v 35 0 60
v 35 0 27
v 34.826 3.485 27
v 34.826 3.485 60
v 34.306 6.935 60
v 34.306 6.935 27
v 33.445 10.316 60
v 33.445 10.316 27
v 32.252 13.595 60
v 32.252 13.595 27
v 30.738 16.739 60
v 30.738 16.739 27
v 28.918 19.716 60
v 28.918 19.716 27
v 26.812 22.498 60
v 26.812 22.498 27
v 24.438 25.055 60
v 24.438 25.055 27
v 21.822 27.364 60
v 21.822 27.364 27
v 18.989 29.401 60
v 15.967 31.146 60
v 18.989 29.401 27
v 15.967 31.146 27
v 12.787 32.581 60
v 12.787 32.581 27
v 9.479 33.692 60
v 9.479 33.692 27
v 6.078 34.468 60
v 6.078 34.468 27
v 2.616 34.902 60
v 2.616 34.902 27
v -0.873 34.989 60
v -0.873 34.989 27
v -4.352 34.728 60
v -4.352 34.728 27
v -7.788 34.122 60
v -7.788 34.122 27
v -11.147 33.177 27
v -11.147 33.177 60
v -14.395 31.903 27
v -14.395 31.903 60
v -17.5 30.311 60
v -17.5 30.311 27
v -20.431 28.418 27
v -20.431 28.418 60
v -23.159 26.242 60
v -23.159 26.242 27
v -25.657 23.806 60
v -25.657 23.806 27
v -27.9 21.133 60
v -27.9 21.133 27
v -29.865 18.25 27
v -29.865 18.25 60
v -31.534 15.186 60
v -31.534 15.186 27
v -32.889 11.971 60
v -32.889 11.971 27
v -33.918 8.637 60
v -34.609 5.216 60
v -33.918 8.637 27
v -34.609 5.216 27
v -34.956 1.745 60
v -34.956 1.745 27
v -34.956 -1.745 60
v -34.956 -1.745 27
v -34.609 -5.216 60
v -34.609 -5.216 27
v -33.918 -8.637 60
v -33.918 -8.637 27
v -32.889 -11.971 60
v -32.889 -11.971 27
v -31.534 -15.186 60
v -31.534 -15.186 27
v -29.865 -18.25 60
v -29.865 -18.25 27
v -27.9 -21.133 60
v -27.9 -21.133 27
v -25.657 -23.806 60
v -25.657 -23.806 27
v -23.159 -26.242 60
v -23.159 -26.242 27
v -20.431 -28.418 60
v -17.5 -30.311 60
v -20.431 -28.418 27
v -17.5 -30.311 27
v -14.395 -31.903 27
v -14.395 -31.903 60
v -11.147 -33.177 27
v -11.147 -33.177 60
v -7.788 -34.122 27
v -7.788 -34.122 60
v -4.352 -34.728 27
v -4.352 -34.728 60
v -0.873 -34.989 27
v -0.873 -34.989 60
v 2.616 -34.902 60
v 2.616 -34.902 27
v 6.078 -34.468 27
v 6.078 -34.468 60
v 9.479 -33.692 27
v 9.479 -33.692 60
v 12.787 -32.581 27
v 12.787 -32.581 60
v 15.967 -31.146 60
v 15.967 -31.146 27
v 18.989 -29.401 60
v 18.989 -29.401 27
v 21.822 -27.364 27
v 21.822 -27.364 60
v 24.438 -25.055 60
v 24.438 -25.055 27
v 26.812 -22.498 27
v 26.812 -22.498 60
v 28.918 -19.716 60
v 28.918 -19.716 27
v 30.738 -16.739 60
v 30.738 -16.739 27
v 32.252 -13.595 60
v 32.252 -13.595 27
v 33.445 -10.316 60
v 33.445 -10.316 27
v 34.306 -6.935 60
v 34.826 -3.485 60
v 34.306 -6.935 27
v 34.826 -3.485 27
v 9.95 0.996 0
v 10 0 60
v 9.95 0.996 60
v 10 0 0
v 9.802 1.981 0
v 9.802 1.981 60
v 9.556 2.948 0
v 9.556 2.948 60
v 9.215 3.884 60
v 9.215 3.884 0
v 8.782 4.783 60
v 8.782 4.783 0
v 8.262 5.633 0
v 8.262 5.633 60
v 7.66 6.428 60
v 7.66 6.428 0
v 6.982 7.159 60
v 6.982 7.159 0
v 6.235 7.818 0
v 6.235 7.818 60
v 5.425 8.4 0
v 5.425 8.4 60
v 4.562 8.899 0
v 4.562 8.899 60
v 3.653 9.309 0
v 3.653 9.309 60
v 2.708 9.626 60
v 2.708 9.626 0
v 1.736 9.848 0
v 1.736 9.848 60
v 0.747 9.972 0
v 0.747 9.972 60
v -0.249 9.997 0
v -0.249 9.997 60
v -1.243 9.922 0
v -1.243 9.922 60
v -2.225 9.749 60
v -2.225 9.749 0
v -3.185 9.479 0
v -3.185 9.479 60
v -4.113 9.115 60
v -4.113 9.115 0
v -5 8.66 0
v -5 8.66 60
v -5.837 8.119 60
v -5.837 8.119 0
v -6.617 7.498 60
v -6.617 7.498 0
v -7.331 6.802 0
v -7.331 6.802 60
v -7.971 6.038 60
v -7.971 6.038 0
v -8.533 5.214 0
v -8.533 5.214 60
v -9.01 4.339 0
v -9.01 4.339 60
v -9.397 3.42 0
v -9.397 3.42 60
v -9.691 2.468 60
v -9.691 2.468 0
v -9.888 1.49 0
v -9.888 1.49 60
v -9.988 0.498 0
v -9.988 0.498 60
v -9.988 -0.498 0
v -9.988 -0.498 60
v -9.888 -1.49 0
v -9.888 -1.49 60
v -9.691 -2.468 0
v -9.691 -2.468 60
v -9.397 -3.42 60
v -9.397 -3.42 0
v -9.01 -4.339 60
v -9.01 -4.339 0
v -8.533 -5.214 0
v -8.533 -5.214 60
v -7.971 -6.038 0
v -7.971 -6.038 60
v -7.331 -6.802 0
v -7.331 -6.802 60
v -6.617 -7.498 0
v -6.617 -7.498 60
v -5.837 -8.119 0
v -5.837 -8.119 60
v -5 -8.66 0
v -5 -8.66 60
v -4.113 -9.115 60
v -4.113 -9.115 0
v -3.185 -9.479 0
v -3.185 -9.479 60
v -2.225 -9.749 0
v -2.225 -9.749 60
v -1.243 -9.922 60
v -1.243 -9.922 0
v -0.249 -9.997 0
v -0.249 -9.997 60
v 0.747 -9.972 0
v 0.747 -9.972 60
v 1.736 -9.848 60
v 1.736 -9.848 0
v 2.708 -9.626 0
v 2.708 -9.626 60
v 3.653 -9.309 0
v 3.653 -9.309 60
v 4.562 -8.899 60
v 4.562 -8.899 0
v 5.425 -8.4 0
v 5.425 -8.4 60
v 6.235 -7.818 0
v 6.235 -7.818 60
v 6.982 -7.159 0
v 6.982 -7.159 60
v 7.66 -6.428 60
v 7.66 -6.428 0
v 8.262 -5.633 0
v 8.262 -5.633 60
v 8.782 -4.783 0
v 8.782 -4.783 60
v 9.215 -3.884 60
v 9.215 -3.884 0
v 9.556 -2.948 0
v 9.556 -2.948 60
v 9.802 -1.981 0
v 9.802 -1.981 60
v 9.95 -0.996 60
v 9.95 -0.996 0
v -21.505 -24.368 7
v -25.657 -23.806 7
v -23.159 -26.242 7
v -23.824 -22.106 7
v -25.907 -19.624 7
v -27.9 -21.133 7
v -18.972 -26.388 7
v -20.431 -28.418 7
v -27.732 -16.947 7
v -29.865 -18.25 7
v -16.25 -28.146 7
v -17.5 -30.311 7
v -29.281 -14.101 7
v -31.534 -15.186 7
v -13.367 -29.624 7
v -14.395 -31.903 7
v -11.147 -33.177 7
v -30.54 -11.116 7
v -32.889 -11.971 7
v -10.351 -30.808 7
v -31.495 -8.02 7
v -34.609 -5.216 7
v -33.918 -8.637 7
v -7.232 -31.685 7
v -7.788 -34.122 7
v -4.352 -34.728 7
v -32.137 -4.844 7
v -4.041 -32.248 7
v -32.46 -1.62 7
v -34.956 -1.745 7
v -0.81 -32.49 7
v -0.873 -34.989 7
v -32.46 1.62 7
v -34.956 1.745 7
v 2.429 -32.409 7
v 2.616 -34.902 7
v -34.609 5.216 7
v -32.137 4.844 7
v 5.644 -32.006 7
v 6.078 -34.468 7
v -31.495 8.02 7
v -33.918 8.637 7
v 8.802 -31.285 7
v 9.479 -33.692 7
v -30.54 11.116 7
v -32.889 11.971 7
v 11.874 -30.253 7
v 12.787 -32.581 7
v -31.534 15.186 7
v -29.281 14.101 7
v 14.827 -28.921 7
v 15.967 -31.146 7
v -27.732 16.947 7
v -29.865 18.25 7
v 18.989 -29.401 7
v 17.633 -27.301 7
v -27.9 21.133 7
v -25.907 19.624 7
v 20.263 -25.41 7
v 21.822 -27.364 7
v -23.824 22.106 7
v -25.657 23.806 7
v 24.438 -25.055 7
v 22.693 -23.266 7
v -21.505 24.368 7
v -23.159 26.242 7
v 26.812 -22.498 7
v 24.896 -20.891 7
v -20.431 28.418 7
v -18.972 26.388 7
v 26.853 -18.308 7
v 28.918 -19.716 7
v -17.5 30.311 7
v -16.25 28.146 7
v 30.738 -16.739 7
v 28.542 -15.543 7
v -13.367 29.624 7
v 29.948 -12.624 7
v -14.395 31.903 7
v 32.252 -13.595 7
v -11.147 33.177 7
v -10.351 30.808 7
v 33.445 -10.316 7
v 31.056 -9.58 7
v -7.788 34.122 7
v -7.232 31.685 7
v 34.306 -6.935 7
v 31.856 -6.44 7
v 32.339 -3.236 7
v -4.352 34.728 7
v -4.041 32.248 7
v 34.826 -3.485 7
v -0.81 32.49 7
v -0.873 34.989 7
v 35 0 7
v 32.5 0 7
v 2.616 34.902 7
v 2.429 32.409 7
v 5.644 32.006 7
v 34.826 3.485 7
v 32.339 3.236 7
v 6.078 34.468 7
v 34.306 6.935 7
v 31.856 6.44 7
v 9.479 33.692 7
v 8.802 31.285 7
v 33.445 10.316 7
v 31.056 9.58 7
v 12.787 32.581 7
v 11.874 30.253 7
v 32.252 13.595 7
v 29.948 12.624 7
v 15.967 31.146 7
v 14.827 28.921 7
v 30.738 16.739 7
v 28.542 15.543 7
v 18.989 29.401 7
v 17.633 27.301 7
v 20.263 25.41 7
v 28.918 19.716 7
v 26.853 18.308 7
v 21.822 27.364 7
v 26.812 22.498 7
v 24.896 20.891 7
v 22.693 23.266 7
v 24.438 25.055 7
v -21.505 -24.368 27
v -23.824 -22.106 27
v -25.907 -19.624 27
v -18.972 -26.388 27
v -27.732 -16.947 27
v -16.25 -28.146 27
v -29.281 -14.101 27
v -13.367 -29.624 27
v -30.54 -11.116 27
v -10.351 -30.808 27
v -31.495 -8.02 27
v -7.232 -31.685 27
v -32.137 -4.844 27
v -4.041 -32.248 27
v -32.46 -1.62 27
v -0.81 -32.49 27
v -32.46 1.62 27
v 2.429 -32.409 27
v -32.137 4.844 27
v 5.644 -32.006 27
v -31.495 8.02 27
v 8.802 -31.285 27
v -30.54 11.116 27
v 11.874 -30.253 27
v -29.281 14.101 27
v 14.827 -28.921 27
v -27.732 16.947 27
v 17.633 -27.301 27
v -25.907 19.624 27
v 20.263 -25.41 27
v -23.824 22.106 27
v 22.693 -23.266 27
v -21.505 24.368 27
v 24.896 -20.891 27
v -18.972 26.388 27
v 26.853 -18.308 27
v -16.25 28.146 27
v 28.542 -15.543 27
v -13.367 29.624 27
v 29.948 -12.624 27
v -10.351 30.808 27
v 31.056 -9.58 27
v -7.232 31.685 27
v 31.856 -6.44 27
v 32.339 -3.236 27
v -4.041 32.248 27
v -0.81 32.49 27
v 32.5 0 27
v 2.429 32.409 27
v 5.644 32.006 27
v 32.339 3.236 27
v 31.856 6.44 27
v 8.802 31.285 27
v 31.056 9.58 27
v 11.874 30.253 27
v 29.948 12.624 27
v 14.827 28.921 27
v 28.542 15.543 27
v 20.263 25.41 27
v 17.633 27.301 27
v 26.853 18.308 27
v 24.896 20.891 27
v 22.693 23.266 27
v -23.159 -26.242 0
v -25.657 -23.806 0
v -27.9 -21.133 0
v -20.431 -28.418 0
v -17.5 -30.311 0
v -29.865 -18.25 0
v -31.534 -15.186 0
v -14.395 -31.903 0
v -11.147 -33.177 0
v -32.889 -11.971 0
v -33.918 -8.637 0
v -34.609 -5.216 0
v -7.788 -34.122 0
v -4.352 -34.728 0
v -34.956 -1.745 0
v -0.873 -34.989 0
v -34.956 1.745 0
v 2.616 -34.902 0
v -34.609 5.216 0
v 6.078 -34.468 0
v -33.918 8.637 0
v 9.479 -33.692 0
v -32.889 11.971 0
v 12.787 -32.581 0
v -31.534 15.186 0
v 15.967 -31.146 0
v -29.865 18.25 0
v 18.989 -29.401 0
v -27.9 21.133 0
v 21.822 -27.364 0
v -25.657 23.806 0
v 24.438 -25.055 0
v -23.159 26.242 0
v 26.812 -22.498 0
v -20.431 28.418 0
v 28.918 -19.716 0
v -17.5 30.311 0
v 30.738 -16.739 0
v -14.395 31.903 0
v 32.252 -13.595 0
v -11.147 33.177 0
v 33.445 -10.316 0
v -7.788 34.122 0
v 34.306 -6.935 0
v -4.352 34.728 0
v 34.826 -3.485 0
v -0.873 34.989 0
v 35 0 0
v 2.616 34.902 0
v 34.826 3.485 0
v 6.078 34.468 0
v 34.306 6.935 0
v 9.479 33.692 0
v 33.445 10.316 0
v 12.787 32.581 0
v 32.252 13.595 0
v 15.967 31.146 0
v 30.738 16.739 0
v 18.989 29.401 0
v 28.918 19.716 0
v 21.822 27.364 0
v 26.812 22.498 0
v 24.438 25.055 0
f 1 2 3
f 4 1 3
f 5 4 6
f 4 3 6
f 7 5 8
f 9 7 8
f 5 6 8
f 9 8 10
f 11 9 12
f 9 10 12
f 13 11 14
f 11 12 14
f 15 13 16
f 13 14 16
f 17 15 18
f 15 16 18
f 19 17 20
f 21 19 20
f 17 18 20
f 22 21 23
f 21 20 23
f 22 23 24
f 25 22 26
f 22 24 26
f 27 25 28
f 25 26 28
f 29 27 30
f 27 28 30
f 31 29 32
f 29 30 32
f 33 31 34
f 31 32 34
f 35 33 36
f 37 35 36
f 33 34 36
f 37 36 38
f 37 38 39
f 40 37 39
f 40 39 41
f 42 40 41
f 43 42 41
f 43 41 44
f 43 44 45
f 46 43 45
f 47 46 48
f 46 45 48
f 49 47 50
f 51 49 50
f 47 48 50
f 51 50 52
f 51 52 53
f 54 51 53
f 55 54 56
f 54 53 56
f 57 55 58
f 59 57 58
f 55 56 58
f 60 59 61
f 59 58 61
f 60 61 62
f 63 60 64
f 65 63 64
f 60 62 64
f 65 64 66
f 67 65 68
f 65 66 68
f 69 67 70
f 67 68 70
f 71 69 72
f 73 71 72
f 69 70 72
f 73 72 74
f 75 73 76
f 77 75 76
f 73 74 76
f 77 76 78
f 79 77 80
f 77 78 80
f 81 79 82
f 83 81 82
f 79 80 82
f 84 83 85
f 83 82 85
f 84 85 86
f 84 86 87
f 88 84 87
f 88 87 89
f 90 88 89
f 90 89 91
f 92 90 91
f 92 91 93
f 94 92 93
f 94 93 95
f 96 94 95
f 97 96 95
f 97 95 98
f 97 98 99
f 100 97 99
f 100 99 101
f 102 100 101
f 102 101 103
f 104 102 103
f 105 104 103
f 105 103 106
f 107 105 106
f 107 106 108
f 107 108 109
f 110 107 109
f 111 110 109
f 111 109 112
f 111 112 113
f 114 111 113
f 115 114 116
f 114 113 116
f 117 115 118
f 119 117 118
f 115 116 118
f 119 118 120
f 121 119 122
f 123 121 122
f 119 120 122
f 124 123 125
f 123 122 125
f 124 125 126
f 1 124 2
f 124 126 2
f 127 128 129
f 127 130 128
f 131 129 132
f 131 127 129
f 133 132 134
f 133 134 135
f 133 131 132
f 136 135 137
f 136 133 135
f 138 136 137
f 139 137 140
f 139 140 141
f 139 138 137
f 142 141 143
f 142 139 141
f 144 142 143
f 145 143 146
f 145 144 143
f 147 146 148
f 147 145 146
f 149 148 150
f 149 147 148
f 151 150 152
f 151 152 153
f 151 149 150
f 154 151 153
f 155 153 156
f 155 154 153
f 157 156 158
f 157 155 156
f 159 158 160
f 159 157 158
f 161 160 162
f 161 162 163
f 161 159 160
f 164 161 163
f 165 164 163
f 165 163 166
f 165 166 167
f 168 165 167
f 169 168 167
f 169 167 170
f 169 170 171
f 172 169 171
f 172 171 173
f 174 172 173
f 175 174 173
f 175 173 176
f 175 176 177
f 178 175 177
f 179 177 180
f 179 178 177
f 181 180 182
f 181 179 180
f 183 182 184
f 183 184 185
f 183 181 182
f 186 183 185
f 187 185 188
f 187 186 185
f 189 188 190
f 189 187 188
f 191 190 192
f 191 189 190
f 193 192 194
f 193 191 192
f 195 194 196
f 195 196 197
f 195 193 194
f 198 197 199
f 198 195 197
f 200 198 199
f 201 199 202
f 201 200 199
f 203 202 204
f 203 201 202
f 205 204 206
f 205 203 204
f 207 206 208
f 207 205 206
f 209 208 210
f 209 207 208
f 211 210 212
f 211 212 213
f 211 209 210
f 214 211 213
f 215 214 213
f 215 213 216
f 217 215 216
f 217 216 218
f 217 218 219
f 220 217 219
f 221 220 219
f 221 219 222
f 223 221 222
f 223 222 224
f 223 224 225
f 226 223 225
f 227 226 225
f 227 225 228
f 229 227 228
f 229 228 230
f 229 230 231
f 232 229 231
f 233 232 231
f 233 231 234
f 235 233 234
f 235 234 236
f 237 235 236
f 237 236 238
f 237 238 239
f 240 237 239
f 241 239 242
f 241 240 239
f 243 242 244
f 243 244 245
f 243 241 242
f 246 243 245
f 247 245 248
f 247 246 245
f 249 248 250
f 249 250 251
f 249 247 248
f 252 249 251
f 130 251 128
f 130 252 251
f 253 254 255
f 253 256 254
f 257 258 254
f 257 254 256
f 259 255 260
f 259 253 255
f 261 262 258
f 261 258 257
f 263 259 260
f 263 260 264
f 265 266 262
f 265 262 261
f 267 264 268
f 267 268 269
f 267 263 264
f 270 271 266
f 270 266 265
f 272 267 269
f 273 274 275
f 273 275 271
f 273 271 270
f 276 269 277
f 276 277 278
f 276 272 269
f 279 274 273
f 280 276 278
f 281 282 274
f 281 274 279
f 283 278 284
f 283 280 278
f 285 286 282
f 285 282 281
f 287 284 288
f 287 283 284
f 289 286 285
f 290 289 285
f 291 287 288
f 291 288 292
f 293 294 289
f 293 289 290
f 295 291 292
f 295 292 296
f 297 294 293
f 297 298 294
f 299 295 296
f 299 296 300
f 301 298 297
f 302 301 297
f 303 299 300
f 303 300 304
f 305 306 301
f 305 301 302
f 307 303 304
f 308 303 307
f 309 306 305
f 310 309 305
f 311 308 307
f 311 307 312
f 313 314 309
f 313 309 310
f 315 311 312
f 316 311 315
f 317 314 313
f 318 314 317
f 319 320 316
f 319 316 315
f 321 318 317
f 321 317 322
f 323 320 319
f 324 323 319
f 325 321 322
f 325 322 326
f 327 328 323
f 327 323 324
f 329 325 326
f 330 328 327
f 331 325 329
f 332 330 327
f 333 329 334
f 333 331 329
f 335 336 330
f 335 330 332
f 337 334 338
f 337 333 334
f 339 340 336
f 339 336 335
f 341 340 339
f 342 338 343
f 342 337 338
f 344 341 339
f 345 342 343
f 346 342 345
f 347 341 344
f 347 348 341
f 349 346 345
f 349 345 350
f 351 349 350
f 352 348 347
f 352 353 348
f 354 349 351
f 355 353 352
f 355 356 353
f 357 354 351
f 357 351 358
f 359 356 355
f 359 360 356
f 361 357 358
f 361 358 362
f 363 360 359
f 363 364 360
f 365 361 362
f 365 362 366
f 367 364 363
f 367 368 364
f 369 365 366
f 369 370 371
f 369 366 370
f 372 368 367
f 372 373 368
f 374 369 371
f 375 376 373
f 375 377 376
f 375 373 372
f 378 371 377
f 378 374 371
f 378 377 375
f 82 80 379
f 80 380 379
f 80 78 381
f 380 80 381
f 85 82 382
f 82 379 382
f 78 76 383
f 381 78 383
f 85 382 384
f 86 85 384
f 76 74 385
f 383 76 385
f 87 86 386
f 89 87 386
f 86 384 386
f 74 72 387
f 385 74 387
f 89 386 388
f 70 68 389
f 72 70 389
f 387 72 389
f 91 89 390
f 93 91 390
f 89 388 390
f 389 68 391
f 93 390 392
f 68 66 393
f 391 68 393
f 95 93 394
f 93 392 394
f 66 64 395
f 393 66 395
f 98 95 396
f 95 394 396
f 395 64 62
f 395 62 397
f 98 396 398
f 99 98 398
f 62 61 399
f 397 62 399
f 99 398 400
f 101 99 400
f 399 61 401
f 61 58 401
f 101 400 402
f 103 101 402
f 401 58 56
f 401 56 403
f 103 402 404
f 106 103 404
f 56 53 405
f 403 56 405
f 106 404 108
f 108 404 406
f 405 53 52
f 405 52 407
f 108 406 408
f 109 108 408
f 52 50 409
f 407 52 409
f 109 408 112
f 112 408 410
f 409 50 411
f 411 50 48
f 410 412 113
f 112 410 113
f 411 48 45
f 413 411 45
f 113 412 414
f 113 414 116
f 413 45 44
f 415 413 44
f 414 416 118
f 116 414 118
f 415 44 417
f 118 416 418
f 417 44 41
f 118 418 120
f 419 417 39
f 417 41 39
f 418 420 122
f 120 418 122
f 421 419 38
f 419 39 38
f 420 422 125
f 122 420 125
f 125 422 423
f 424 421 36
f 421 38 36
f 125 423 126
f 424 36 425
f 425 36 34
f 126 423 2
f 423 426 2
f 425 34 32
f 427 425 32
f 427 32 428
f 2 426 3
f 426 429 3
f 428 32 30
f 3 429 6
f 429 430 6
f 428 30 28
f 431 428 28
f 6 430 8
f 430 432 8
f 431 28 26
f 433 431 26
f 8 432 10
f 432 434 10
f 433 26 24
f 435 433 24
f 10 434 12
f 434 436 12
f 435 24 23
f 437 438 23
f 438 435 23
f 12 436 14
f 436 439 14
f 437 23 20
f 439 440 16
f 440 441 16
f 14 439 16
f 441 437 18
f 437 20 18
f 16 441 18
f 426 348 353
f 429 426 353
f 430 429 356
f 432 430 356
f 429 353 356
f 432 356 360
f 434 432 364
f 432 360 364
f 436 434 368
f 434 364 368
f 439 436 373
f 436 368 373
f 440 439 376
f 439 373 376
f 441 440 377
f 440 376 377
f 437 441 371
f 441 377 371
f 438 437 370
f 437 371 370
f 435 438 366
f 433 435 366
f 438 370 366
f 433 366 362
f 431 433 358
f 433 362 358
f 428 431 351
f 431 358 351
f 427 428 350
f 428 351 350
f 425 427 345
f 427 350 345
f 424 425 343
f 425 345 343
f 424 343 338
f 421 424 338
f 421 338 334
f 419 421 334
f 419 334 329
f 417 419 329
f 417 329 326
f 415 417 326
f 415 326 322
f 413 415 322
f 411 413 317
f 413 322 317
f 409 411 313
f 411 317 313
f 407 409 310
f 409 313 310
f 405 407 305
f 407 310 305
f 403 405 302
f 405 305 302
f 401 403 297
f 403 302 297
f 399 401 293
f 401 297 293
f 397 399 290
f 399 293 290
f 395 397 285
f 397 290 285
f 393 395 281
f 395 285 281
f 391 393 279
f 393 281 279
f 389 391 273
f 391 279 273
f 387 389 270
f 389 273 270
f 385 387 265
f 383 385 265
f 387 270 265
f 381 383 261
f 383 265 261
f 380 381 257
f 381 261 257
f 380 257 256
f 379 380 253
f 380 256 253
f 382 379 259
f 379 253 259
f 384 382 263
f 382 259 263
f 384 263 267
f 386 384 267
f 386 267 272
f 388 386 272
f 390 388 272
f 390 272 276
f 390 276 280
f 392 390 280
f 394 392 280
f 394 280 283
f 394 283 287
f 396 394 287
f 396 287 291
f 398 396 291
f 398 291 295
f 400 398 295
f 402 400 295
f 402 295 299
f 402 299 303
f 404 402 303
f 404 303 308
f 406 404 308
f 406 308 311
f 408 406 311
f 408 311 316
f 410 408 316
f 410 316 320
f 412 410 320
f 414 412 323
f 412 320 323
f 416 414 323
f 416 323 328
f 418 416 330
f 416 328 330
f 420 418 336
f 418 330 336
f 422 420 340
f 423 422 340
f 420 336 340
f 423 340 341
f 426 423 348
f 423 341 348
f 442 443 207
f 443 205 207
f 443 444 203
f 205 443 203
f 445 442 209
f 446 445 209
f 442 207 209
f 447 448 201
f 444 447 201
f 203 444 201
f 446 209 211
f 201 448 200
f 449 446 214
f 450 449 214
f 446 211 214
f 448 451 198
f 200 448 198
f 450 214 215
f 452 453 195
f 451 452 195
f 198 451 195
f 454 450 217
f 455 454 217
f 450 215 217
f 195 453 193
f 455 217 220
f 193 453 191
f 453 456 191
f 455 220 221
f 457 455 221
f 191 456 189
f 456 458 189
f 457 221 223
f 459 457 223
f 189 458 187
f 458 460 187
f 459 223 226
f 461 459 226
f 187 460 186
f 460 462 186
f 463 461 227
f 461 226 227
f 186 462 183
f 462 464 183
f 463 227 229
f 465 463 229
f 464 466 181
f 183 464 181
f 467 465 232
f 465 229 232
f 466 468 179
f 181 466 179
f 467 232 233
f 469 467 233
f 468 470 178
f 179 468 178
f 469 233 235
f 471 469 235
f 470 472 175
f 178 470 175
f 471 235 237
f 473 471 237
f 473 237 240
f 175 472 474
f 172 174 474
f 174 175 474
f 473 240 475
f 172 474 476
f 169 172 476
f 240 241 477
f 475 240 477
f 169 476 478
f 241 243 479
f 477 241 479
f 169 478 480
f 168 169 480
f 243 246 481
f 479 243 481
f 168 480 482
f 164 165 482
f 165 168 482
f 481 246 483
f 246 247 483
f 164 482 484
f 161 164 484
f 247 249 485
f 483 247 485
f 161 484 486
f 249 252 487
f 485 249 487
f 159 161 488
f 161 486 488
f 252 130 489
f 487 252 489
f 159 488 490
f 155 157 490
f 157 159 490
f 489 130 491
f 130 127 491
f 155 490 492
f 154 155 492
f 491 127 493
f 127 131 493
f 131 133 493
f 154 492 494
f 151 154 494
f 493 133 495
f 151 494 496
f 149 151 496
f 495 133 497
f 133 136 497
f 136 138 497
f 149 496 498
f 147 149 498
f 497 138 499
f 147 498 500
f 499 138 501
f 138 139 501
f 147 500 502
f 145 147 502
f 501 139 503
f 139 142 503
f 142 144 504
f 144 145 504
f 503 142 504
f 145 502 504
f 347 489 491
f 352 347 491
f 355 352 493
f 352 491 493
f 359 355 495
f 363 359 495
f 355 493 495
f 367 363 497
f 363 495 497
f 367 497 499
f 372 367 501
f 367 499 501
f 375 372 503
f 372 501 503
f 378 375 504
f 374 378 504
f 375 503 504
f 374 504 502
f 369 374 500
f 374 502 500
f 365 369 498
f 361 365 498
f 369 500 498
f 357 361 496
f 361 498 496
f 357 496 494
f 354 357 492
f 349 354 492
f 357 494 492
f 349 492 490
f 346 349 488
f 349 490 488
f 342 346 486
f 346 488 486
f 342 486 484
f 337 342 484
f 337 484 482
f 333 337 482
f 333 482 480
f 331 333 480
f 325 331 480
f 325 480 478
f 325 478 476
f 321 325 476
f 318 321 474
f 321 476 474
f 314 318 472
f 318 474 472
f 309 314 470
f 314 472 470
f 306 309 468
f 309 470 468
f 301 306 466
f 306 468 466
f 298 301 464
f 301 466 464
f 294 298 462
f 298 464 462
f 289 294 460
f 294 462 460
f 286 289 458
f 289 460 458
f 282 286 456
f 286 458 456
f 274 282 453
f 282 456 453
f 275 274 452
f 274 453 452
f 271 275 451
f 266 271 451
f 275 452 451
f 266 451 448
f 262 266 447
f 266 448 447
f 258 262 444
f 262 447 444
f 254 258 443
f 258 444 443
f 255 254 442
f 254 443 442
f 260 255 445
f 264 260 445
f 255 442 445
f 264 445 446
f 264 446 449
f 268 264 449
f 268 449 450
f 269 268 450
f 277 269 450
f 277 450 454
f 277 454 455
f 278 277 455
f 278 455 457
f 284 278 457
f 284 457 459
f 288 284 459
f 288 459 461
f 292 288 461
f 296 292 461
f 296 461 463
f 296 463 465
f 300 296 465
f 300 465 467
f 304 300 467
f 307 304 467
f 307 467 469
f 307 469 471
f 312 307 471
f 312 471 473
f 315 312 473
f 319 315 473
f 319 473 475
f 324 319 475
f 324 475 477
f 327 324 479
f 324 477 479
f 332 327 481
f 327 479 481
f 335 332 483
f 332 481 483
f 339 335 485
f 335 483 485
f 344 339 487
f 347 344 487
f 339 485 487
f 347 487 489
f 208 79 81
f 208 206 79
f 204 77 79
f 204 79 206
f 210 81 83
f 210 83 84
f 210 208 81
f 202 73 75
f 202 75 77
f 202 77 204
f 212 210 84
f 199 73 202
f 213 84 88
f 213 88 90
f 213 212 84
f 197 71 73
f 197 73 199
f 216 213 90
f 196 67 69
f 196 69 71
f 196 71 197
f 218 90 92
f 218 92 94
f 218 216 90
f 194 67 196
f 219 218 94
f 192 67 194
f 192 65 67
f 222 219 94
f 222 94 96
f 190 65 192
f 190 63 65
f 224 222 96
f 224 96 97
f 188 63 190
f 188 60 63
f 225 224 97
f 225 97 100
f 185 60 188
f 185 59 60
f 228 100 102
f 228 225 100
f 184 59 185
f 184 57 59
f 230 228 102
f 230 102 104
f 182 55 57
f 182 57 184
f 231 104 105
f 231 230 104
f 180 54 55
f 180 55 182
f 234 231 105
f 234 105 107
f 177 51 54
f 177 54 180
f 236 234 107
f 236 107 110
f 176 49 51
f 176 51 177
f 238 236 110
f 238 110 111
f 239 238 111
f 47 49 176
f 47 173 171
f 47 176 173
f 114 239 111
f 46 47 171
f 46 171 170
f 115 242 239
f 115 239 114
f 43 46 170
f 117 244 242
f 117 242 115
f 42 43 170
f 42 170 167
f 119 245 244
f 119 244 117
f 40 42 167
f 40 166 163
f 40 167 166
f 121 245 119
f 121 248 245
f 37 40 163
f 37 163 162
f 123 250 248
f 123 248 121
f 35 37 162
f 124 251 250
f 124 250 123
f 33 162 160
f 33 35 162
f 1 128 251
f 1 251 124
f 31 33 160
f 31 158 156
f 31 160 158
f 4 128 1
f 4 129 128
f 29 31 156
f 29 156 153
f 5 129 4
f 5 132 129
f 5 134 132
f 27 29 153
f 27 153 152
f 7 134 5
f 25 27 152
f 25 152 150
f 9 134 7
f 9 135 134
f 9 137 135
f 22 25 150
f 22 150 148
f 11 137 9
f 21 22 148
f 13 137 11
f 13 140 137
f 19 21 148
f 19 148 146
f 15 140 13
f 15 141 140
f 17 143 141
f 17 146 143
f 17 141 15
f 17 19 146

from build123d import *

# Parameters (mm, degrees)
ESQUISSE1_R        = 35
ESQUISSE1_R_2      = 10
BOSS_EXTRU_1_DEPTH = 7
ESQUISSE2_R        = 32.5
ESQUISSE2_R_2      = 10
BOSS_EXTRU_2_DEPTH = 20
ESQUISSE3_R        = 35
ESQUISSE3_R_2      = 10
BOSS_EXTRU_3_DEPTH = 33


with BuildPart() as part:
    # Esquisse1 → Boss.-Extru.1 (new body)
    with BuildSketch(Plane.XY):
        Circle(ESQUISSE1_R)
        Circle(ESQUISSE1_R_2, mode=Mode.SUBTRACT)
    extrude(amount=BOSS_EXTRU_1_DEPTH)

    # Esquisse2 → Boss.-Extru.2 (add)
    with BuildSketch(Plane.XY.offset(7)):
        Circle(ESQUISSE2_R)
        Circle(ESQUISSE2_R_2, mode=Mode.SUBTRACT)
    extrude(amount=BOSS_EXTRU_2_DEPTH)

    # Esquisse3 → Boss.-Extru.3 (add)
    with BuildSketch(Plane.XY.offset(27)):
        Circle(ESQUISSE3_R)
        Circle(ESQUISSE3_R_2, mode=Mode.SUBTRACT)
    extrude(amount=BOSS_EXTRU_3_DEPTH)


solid = part.part
